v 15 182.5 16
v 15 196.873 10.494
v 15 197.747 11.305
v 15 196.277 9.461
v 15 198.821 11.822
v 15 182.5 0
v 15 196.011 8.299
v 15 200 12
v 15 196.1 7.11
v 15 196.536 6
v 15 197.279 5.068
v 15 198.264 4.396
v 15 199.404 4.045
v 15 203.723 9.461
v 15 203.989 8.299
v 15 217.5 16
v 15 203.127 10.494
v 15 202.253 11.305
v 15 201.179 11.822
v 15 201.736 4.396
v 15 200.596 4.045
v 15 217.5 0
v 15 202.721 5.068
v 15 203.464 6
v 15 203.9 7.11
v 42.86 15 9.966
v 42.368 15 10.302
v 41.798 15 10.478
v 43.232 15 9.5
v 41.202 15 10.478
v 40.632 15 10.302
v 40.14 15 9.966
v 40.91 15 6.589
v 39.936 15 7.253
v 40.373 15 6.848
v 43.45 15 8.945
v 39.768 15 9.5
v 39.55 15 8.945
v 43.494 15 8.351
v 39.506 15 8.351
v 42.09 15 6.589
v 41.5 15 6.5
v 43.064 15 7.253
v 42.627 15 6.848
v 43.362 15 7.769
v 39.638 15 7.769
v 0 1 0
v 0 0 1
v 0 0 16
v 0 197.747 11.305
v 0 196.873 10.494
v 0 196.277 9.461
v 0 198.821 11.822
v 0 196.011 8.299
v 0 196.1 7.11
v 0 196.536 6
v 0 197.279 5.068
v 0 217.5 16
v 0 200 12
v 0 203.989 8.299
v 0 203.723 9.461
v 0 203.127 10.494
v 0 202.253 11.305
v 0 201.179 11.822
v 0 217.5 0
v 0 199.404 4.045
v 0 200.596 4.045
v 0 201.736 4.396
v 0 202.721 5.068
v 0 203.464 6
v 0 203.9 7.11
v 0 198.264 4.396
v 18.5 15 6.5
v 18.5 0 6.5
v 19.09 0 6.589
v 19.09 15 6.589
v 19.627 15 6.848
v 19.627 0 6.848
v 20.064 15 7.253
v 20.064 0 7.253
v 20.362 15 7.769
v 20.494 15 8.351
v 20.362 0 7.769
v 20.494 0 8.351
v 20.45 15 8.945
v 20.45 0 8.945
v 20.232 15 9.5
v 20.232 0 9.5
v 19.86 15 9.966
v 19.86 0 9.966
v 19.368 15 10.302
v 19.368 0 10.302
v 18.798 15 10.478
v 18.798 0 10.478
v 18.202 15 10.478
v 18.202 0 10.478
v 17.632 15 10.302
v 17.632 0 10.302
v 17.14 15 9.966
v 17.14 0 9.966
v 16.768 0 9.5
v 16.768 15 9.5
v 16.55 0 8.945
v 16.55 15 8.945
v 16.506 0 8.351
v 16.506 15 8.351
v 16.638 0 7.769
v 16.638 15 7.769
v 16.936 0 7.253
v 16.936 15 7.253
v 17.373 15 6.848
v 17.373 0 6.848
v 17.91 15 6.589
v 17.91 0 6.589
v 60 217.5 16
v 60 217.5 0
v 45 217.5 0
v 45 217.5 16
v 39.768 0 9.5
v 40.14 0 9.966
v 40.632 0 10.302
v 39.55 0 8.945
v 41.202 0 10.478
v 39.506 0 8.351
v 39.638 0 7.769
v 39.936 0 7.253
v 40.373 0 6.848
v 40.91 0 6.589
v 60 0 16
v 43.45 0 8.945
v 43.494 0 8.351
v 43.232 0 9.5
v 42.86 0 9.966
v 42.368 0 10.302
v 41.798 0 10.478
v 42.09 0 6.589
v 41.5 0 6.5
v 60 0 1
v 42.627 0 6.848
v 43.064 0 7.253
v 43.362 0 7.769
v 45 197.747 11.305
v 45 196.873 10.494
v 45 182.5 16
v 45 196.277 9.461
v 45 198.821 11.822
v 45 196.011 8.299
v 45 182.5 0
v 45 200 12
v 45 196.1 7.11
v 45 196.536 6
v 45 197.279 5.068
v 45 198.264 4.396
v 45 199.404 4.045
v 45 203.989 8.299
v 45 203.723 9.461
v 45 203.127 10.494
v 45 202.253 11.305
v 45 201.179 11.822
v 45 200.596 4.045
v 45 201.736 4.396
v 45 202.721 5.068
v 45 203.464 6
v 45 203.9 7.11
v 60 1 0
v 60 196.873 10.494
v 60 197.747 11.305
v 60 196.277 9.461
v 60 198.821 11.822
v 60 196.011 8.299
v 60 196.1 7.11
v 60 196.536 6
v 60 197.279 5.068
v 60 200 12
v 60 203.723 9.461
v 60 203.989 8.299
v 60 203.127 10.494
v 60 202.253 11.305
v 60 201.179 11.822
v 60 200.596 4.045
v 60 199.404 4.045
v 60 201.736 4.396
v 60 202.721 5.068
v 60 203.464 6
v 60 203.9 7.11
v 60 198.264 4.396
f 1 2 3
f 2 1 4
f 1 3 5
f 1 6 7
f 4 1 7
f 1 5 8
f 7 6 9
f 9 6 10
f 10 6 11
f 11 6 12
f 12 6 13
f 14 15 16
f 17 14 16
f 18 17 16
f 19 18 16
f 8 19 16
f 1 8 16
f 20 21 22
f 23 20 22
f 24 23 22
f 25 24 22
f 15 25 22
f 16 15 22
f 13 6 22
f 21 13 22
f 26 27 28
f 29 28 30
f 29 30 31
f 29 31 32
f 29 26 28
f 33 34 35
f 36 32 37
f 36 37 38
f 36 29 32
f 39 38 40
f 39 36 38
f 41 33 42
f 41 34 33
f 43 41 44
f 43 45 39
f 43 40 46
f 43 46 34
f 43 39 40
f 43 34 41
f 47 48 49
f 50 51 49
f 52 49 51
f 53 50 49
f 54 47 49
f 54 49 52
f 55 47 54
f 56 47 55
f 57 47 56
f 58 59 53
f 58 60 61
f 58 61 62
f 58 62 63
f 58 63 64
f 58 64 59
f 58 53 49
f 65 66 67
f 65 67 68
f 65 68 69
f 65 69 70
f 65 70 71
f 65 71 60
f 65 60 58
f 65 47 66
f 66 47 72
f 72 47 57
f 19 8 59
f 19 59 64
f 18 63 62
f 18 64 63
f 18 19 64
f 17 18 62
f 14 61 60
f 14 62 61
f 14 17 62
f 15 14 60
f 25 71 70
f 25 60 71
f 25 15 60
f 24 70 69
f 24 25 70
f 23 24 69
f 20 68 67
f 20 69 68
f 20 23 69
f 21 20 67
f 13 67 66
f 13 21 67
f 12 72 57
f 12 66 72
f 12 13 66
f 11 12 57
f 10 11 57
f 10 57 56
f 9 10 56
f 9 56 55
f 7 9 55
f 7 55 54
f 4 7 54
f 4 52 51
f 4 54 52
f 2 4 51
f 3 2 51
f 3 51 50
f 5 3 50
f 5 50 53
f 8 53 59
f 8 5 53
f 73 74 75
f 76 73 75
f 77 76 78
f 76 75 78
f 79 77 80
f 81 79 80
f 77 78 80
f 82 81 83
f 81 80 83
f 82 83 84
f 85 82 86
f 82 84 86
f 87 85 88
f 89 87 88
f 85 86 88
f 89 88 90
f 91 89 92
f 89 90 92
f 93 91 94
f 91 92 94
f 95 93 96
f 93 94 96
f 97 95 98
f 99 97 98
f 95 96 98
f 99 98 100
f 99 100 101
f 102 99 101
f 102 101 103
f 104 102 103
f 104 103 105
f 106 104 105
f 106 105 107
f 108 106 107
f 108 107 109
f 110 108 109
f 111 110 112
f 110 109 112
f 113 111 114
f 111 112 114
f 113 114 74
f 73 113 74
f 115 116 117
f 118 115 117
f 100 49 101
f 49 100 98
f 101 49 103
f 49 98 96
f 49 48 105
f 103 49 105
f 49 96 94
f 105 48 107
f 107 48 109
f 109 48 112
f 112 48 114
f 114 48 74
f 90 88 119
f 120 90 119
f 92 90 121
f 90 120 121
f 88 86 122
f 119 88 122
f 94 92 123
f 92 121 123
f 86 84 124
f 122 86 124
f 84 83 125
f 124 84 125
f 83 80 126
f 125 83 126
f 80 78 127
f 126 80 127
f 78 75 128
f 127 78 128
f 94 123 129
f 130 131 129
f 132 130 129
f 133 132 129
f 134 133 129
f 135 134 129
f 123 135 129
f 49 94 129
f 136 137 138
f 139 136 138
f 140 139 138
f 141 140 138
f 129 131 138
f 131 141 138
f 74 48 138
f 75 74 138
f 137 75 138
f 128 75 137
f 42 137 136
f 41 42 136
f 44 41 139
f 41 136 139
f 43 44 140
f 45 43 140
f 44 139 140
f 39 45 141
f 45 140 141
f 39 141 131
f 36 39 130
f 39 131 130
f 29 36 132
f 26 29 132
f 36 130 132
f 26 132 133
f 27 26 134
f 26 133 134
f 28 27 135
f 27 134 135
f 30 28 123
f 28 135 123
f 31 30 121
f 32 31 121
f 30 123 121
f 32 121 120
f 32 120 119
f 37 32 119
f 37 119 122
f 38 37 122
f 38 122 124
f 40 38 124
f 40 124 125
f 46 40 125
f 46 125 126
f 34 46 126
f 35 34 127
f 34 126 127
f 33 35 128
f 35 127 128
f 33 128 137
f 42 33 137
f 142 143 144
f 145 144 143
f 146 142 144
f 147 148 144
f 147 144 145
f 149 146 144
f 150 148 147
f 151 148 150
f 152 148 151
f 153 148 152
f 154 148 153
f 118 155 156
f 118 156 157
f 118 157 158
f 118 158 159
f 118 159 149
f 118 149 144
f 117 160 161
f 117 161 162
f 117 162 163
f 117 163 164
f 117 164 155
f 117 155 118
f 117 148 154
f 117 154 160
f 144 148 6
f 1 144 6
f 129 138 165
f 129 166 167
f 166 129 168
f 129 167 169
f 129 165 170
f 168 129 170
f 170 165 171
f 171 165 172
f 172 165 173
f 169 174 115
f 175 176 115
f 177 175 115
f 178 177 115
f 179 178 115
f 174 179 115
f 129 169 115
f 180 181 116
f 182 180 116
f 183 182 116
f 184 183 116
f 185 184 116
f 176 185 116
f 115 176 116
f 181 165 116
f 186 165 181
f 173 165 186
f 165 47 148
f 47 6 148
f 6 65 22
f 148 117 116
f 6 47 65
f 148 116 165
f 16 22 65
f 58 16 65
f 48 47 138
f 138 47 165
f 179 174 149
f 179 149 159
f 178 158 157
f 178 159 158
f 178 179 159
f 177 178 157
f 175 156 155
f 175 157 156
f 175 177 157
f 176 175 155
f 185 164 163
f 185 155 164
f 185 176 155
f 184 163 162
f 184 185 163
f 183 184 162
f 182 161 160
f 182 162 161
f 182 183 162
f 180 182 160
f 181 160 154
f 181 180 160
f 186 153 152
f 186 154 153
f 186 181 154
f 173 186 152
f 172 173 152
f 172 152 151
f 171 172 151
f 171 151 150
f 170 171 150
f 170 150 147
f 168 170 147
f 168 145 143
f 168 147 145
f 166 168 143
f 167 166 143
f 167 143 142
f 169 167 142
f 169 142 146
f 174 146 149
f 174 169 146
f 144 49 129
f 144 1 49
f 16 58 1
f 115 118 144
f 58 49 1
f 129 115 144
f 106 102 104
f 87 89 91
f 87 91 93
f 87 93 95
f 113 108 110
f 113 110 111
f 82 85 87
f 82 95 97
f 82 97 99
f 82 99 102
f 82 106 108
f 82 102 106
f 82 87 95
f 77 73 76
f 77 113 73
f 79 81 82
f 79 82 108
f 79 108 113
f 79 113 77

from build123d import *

# Parameters (mm, degrees)
SKETCH1_W               = 60
SKETCH1_H               = 250
BOSS_EXTRUDE1_DEPTH     = 16
CHAMFER1_SIZE           = 1
SKETCH2_R               = 2
CUT_EXTRUDE1_DEPTH      = 15
CUT_EXTRUDE4_REACH      = 259.597
SKETCH5_W               = 30
SKETCH5_H               = 35
CUT_EXTRUDE5_DEPTH      = 255.521118967
CUT_EXTRUDE5_DEPTH_BACK = 255.521118967
SKETCH6_R               = 4
SKETCH7_W               = 60
SKETCH7_H               = 32.5
CUT_EXTRUDE6_DEPTH      = 258.596583828


with BuildPart() as part:
    # Sketch1 → Boss-Extrude1 (new body)
    with BuildSketch(Plane.XY):
        with Locations((30, 125)):
            Rectangle(SKETCH1_W, SKETCH1_H)
    extrude(amount=BOSS_EXTRUDE1_DEPTH)

    # Chamfer1
    chamfer1_edges = [part.edges().sort_by_distance(p)[0] for p in [
        (30, 0, 0),
    ]]
    chamfer(chamfer1_edges, length=CHAMFER1_SIZE)

    # Sketch2 → Cut-Extrude1 (cut)
    with BuildSketch(Plane(origin=(0, 0, 0), x_dir=(-1, 0, 0), z_dir=(0, -1, 0))):
        with Locations(Location((-41.5, -8.5, 0), (0, 0, 90))):
            Circle(SKETCH2_R)
        with Locations(Location((-18.5, -8.5, 0), (0, 0, 90))):
            Circle(SKETCH2_R)
    extrude(amount=-CUT_EXTRUDE1_DEPTH, mode=Mode.SUBTRACT)

    # Sketch5 → Cut-Extrude4 (cut, up to next)
    with BuildSketch(Plane(origin=(0, 0, 0), x_dir=(-1, 0, 0), z_dir=(0, 0, -1)), mode=Mode.PRIVATE) as cut_extrude4_sk1:
        with Locations((-30, 200)):
            Rectangle(SKETCH5_W, SKETCH5_H)
    cut_extrude4_tool1 = extrude(cut_extrude4_sk1.sketch, amount=-CUT_EXTRUDE4_REACH, mode=Mode.PRIVATE) & part.part
    add(cut_extrude4_tool1.solids().sort_by_distance((30, 200, 0))[0], mode=Mode.SUBTRACT)

    # Sketch6 → Cut-Extrude5 (cut, two sides: drawn at the far end of the back side and taken through both)
    with BuildSketch(Plane.ZY.offset(-45).offset(-CUT_EXTRUDE5_DEPTH_BACK)):
        with Locations((8, 200)):
            Circle(SKETCH6_R)
    extrude(amount=CUT_EXTRUDE5_DEPTH + CUT_EXTRUDE5_DEPTH_BACK, mode=Mode.SUBTRACT)

    # Sketch7 → Cut-Extrude6 (cut, through all)
    with BuildSketch(Plane(origin=(0, 0, 0), x_dir=(-1, 0, 0), z_dir=(0, 0, -1))):
        with Locations((-30, 233.75)):
            Rectangle(SKETCH7_W, SKETCH7_H)
    extrude(amount=-CUT_EXTRUDE6_DEPTH, mode=Mode.SUBTRACT)


solid = part.part
